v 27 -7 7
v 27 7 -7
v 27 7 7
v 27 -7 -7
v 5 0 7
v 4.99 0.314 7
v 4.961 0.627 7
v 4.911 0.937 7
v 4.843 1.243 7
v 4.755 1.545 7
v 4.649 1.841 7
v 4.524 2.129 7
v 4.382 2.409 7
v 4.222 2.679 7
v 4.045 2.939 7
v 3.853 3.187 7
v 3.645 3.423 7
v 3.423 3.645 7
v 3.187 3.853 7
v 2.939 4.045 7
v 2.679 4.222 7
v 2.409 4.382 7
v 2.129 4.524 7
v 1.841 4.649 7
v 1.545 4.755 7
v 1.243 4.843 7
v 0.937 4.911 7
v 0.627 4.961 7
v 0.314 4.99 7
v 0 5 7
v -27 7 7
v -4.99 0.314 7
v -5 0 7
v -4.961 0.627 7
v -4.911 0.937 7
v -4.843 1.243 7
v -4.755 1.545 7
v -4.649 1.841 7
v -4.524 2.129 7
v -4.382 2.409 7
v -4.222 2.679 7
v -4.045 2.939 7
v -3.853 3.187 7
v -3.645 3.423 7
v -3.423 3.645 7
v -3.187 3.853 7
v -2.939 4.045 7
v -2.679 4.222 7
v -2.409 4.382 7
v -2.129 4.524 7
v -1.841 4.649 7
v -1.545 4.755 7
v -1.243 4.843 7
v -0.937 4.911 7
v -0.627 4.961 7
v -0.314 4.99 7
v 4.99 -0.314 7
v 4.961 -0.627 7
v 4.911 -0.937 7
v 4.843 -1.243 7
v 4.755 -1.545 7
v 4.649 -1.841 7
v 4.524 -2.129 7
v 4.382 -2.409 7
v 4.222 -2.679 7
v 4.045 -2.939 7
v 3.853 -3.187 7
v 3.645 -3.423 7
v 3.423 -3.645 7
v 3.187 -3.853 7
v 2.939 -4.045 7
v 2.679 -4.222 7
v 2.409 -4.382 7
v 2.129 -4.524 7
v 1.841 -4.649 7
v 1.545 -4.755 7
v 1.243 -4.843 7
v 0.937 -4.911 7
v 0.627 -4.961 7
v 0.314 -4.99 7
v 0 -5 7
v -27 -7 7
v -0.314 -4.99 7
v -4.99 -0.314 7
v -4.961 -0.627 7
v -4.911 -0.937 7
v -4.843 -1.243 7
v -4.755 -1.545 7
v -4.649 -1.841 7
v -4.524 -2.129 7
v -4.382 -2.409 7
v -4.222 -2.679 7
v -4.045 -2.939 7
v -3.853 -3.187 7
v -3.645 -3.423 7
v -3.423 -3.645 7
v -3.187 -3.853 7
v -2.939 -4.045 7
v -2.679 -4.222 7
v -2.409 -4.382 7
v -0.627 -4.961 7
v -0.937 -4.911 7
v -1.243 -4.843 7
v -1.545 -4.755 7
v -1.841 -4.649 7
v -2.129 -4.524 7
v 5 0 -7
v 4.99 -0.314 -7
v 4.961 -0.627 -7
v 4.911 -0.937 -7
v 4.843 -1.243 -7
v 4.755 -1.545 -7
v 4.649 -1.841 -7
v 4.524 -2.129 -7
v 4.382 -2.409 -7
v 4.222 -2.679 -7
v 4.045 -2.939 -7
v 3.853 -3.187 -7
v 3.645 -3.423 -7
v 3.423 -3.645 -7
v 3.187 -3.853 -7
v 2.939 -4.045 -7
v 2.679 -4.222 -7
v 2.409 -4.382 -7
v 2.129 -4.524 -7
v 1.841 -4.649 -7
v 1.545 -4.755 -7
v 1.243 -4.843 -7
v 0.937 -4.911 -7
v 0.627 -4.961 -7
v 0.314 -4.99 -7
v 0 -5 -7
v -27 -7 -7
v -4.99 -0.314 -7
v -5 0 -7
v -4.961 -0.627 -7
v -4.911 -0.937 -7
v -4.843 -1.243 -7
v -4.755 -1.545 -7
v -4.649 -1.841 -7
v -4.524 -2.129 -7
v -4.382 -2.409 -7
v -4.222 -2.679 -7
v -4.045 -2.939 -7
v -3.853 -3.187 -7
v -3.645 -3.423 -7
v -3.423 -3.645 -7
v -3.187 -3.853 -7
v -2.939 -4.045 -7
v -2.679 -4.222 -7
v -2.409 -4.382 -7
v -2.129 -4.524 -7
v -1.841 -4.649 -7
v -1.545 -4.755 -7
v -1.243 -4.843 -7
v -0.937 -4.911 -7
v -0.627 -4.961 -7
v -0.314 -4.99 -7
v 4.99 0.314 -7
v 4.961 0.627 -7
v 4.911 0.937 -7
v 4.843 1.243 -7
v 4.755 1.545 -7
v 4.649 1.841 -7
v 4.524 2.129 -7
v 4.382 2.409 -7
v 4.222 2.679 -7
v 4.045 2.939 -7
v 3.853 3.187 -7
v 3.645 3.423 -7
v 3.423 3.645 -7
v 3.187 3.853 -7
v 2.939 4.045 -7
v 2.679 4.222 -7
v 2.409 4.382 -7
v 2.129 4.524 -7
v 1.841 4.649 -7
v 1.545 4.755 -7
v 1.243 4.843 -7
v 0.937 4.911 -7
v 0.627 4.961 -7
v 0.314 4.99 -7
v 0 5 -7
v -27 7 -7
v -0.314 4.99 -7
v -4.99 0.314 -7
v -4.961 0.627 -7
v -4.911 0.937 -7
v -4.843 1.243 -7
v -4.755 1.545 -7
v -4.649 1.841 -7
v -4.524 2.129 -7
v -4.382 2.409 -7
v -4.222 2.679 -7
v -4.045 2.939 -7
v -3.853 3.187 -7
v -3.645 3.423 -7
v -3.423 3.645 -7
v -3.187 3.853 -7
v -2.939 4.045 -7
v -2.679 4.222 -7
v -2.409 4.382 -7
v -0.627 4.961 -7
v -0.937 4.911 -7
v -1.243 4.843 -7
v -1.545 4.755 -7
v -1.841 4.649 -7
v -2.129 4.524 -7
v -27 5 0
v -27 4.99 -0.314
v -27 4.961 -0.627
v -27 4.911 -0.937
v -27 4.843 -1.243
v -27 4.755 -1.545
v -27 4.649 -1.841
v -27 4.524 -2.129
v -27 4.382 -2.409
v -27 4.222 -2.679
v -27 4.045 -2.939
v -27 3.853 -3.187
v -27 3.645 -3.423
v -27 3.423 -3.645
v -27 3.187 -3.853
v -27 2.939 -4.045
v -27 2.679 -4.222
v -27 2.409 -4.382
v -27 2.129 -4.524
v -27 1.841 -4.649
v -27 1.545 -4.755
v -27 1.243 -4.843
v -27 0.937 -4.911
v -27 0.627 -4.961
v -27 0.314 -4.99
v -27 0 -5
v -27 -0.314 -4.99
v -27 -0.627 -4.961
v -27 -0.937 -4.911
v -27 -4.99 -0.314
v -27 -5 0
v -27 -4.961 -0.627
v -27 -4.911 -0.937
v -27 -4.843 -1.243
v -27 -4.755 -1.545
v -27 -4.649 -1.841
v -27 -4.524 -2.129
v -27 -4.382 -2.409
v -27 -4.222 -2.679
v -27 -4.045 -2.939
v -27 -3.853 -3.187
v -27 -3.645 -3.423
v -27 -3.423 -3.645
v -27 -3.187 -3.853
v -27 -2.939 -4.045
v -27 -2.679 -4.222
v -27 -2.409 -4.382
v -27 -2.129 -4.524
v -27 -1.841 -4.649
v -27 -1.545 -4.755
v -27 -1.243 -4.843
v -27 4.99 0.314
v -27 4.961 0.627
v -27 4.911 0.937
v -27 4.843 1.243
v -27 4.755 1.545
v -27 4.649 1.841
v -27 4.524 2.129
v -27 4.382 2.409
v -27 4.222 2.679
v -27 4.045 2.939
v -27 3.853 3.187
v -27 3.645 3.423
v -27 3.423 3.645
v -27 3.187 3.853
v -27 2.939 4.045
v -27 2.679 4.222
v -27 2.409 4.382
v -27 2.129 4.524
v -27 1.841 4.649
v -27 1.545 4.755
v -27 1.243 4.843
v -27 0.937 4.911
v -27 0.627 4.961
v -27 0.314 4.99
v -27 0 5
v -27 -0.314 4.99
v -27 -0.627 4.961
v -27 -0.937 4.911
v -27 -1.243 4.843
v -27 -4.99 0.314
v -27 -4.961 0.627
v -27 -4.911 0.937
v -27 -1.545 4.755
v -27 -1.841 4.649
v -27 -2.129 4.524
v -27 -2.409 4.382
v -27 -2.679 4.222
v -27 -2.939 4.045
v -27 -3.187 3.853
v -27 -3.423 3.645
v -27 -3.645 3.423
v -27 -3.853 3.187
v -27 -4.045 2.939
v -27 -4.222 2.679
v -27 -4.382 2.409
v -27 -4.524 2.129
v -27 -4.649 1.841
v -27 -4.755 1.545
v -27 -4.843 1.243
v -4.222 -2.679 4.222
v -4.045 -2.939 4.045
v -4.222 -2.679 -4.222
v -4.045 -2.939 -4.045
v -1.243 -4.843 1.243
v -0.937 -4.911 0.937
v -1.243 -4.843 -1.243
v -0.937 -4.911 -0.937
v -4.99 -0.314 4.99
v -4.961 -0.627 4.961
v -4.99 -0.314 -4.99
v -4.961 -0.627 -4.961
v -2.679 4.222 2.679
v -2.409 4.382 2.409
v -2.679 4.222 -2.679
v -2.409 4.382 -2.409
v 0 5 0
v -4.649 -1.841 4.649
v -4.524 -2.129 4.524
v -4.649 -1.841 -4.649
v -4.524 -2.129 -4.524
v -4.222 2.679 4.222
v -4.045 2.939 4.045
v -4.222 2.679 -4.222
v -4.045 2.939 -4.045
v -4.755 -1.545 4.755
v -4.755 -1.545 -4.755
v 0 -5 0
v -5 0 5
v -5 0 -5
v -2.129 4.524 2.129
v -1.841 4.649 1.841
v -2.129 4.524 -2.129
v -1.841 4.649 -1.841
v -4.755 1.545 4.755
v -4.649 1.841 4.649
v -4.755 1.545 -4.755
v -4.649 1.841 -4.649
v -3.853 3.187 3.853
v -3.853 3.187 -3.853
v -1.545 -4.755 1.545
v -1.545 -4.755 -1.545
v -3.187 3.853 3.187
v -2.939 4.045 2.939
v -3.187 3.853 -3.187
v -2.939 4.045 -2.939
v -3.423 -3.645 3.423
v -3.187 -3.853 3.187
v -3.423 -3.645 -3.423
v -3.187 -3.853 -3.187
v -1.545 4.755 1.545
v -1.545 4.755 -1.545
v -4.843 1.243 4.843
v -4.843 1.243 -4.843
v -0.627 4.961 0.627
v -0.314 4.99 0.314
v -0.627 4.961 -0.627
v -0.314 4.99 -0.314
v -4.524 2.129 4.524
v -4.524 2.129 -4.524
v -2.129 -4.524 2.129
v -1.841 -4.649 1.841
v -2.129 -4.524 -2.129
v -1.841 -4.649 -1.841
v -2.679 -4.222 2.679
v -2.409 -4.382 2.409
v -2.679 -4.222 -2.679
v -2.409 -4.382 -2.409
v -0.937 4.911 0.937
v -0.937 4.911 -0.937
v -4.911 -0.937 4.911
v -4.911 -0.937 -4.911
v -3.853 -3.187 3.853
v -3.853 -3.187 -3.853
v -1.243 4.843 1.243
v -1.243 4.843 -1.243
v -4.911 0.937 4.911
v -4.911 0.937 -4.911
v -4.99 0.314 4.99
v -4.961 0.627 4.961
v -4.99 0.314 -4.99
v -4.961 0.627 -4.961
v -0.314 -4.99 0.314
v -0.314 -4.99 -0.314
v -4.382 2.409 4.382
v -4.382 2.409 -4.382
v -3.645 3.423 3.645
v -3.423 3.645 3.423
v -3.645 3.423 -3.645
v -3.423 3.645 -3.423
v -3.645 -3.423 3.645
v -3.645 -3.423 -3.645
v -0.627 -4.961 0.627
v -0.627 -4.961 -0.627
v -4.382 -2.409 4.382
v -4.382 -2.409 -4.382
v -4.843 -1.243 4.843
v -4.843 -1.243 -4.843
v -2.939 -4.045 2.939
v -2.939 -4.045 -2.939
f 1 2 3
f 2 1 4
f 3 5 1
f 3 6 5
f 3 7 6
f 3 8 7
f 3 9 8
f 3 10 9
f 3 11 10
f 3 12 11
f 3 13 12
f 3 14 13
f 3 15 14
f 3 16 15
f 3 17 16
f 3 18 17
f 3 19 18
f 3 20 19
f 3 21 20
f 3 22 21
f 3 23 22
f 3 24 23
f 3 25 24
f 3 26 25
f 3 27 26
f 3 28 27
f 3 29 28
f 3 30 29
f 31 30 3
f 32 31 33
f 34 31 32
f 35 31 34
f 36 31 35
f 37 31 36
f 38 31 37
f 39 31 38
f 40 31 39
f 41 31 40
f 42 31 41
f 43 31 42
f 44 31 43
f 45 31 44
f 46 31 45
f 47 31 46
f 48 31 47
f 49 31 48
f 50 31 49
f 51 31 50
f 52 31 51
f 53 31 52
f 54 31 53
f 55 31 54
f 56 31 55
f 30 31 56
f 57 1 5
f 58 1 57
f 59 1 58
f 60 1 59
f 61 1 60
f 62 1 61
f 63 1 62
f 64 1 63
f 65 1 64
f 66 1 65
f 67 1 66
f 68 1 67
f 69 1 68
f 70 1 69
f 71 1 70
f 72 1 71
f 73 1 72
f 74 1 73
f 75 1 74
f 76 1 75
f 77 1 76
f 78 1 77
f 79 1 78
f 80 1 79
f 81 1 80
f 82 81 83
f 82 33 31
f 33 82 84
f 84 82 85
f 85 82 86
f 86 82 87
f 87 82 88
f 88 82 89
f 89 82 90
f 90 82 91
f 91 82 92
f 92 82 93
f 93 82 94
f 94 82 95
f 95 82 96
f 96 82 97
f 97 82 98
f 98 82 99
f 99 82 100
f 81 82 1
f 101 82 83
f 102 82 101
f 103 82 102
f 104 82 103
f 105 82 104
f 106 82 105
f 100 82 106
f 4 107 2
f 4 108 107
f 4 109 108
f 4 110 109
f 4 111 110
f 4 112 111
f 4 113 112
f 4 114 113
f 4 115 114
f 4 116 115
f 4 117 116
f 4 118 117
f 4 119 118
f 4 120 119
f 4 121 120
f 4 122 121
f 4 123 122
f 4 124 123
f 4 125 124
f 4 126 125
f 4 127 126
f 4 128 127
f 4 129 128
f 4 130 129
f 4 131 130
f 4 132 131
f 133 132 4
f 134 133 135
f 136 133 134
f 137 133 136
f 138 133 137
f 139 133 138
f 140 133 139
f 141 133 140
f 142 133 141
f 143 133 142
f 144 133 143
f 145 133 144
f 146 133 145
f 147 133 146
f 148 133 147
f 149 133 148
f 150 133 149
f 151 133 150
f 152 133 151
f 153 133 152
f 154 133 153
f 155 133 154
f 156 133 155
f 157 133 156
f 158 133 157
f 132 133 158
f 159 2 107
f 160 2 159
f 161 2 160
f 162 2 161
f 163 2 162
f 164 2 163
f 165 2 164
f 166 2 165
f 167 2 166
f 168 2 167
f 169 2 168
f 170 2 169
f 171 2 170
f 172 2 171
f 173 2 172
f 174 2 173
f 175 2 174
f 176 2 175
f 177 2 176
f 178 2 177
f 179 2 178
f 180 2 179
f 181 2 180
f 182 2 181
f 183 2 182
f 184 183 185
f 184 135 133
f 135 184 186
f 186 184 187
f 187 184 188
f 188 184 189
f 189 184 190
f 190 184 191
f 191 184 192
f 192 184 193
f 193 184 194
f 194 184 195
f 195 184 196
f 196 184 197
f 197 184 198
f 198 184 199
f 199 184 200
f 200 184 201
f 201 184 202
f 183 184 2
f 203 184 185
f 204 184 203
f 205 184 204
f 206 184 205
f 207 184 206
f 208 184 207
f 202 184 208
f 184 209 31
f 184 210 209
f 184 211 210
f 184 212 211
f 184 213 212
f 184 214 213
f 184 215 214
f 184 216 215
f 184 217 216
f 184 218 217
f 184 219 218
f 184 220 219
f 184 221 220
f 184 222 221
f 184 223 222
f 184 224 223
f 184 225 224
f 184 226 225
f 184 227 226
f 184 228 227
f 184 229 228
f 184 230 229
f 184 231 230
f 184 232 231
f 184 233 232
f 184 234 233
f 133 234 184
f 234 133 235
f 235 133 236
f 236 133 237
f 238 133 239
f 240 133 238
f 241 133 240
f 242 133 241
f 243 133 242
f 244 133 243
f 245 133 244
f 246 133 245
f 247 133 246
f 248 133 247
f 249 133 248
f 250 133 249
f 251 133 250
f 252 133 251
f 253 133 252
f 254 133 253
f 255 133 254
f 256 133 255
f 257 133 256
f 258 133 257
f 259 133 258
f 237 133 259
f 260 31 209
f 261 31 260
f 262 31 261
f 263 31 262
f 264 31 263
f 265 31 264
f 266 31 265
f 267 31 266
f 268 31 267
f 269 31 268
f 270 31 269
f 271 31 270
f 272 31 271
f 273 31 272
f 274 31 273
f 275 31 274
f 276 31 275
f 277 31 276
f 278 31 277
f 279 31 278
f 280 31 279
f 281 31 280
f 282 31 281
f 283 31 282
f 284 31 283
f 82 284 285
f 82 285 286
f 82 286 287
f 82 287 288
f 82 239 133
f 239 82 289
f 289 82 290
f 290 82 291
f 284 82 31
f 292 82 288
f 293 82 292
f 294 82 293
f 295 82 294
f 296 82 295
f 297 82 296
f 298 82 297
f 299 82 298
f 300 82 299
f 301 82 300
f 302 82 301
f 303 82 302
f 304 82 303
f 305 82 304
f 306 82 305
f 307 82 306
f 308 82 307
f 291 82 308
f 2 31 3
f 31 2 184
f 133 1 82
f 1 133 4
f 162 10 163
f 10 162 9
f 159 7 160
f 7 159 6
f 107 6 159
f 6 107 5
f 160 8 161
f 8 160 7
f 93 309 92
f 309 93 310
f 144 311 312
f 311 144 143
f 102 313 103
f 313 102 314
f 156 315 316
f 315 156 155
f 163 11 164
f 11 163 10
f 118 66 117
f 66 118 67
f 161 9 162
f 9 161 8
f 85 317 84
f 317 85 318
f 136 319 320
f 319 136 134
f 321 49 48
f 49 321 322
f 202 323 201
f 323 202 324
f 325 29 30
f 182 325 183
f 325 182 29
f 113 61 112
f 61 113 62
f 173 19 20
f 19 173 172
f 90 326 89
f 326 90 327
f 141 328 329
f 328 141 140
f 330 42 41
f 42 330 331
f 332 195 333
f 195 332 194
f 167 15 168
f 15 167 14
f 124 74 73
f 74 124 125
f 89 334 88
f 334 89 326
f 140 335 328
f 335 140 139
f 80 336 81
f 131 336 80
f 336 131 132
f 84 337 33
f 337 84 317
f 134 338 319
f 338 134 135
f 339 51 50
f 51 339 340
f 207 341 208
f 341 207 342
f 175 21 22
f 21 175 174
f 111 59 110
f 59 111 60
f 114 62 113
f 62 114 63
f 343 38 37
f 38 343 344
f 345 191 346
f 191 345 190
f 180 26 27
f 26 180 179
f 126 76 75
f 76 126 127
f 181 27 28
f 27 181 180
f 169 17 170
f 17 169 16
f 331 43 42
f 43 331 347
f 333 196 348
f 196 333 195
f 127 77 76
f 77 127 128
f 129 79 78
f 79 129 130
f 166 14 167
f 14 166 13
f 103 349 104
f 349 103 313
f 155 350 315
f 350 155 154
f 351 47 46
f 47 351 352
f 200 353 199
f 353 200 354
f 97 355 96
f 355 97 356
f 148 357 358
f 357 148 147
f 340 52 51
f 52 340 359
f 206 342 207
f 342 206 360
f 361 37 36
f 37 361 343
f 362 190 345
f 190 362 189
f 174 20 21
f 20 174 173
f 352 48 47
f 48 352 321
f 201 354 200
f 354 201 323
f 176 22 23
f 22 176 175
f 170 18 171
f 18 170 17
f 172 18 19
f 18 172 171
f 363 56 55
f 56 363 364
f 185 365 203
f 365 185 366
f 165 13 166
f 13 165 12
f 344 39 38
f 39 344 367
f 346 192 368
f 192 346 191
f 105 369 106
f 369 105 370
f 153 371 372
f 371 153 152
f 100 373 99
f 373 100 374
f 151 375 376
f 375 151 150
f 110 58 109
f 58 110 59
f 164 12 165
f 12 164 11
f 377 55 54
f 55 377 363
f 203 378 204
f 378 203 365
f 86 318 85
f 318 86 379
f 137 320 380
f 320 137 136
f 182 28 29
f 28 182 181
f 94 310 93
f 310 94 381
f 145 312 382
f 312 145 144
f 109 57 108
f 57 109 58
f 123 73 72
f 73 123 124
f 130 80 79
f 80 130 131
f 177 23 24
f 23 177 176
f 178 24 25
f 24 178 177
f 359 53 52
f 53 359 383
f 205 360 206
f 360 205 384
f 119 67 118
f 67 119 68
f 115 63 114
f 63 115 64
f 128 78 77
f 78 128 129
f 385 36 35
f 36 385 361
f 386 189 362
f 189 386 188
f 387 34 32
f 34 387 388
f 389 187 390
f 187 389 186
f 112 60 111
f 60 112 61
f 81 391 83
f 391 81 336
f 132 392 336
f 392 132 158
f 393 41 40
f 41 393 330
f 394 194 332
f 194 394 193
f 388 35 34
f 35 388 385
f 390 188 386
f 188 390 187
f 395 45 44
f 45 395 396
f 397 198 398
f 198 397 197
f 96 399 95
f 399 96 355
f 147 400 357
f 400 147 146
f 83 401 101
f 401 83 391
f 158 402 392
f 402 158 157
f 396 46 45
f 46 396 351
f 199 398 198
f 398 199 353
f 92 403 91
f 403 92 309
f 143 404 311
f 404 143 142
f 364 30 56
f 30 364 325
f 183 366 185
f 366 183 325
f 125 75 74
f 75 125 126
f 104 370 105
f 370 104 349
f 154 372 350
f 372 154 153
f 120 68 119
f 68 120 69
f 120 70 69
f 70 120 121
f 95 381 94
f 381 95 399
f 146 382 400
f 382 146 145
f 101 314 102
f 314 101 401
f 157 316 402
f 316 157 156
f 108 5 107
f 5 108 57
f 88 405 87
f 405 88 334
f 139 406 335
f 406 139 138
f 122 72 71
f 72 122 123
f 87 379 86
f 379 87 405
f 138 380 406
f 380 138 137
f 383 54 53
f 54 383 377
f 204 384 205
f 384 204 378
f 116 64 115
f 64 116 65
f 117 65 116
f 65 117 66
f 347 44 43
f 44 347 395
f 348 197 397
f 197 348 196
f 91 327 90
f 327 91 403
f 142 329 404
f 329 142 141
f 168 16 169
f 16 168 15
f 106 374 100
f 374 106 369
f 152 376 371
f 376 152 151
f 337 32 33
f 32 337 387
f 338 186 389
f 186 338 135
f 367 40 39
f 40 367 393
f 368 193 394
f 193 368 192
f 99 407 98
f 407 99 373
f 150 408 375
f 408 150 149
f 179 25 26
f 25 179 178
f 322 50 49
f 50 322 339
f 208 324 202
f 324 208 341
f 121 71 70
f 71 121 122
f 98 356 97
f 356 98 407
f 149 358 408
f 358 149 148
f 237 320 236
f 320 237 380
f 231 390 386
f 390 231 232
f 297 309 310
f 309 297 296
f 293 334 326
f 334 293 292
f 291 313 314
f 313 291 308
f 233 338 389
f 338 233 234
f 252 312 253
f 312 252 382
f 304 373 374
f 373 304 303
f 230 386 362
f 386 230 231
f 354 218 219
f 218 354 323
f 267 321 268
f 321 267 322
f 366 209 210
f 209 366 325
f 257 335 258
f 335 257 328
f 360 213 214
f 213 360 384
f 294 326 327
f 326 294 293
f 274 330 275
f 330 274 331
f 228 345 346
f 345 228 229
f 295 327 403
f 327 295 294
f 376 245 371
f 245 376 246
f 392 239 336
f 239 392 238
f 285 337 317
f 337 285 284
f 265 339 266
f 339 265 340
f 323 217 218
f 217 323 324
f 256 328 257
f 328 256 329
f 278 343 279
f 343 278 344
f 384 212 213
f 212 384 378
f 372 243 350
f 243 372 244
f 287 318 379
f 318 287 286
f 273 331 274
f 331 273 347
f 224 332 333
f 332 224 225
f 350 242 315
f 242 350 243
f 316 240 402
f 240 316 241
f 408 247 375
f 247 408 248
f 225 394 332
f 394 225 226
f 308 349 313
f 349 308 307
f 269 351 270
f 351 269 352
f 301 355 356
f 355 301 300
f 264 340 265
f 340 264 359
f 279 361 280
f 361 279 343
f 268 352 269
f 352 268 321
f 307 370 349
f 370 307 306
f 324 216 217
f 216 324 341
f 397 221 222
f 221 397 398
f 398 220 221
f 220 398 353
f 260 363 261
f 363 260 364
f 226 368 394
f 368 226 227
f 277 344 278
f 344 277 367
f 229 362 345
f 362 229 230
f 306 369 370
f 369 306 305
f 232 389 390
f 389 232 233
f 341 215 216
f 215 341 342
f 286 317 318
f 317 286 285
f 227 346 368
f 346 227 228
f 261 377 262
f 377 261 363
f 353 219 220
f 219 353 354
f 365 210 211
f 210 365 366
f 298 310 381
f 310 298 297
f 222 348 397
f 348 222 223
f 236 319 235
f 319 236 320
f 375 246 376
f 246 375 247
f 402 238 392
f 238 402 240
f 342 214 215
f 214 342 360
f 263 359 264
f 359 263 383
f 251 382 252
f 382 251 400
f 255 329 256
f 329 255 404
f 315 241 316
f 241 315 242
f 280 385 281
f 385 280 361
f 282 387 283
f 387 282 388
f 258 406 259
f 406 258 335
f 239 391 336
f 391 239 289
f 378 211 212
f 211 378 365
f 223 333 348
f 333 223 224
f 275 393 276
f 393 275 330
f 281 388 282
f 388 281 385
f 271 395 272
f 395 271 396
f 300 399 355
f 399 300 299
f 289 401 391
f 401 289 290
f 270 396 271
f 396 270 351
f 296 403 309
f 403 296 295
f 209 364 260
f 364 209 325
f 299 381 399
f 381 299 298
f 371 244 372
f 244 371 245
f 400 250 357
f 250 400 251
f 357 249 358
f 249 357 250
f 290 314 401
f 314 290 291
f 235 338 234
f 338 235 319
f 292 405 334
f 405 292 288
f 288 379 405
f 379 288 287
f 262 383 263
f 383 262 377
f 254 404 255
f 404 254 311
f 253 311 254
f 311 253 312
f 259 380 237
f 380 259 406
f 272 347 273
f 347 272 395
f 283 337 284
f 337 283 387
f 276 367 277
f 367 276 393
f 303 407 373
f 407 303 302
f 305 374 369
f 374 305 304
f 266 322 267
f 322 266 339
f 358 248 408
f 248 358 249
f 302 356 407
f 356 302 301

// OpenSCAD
/* 
	Supplemental T-Junction 4

*/

$fn = 100;  // Increase the resolution of the cylinders
pipe_radius = 5;
pipe_length = 50;

// Define the cube dimensions
cube_size = [pipe_length + 4, 2*pipe_radius + 4, 2*pipe_radius + 4];

difference() {
    // Create the cube
    translate([0, 0, 0])
    cube(cube_size, center=true);

    // Subtract the x-axis pipe
    translate([0, 0, 0])
    cylinder(h=pipe_length, r=pipe_radius, center=true);

    // Subtract the y-axis pipe
    rotate([0, 90, 0])
    translate([0, 0, -pipe_length/2])
    cylinder(h=pipe_length, r=pipe_radius, center=true);
}
